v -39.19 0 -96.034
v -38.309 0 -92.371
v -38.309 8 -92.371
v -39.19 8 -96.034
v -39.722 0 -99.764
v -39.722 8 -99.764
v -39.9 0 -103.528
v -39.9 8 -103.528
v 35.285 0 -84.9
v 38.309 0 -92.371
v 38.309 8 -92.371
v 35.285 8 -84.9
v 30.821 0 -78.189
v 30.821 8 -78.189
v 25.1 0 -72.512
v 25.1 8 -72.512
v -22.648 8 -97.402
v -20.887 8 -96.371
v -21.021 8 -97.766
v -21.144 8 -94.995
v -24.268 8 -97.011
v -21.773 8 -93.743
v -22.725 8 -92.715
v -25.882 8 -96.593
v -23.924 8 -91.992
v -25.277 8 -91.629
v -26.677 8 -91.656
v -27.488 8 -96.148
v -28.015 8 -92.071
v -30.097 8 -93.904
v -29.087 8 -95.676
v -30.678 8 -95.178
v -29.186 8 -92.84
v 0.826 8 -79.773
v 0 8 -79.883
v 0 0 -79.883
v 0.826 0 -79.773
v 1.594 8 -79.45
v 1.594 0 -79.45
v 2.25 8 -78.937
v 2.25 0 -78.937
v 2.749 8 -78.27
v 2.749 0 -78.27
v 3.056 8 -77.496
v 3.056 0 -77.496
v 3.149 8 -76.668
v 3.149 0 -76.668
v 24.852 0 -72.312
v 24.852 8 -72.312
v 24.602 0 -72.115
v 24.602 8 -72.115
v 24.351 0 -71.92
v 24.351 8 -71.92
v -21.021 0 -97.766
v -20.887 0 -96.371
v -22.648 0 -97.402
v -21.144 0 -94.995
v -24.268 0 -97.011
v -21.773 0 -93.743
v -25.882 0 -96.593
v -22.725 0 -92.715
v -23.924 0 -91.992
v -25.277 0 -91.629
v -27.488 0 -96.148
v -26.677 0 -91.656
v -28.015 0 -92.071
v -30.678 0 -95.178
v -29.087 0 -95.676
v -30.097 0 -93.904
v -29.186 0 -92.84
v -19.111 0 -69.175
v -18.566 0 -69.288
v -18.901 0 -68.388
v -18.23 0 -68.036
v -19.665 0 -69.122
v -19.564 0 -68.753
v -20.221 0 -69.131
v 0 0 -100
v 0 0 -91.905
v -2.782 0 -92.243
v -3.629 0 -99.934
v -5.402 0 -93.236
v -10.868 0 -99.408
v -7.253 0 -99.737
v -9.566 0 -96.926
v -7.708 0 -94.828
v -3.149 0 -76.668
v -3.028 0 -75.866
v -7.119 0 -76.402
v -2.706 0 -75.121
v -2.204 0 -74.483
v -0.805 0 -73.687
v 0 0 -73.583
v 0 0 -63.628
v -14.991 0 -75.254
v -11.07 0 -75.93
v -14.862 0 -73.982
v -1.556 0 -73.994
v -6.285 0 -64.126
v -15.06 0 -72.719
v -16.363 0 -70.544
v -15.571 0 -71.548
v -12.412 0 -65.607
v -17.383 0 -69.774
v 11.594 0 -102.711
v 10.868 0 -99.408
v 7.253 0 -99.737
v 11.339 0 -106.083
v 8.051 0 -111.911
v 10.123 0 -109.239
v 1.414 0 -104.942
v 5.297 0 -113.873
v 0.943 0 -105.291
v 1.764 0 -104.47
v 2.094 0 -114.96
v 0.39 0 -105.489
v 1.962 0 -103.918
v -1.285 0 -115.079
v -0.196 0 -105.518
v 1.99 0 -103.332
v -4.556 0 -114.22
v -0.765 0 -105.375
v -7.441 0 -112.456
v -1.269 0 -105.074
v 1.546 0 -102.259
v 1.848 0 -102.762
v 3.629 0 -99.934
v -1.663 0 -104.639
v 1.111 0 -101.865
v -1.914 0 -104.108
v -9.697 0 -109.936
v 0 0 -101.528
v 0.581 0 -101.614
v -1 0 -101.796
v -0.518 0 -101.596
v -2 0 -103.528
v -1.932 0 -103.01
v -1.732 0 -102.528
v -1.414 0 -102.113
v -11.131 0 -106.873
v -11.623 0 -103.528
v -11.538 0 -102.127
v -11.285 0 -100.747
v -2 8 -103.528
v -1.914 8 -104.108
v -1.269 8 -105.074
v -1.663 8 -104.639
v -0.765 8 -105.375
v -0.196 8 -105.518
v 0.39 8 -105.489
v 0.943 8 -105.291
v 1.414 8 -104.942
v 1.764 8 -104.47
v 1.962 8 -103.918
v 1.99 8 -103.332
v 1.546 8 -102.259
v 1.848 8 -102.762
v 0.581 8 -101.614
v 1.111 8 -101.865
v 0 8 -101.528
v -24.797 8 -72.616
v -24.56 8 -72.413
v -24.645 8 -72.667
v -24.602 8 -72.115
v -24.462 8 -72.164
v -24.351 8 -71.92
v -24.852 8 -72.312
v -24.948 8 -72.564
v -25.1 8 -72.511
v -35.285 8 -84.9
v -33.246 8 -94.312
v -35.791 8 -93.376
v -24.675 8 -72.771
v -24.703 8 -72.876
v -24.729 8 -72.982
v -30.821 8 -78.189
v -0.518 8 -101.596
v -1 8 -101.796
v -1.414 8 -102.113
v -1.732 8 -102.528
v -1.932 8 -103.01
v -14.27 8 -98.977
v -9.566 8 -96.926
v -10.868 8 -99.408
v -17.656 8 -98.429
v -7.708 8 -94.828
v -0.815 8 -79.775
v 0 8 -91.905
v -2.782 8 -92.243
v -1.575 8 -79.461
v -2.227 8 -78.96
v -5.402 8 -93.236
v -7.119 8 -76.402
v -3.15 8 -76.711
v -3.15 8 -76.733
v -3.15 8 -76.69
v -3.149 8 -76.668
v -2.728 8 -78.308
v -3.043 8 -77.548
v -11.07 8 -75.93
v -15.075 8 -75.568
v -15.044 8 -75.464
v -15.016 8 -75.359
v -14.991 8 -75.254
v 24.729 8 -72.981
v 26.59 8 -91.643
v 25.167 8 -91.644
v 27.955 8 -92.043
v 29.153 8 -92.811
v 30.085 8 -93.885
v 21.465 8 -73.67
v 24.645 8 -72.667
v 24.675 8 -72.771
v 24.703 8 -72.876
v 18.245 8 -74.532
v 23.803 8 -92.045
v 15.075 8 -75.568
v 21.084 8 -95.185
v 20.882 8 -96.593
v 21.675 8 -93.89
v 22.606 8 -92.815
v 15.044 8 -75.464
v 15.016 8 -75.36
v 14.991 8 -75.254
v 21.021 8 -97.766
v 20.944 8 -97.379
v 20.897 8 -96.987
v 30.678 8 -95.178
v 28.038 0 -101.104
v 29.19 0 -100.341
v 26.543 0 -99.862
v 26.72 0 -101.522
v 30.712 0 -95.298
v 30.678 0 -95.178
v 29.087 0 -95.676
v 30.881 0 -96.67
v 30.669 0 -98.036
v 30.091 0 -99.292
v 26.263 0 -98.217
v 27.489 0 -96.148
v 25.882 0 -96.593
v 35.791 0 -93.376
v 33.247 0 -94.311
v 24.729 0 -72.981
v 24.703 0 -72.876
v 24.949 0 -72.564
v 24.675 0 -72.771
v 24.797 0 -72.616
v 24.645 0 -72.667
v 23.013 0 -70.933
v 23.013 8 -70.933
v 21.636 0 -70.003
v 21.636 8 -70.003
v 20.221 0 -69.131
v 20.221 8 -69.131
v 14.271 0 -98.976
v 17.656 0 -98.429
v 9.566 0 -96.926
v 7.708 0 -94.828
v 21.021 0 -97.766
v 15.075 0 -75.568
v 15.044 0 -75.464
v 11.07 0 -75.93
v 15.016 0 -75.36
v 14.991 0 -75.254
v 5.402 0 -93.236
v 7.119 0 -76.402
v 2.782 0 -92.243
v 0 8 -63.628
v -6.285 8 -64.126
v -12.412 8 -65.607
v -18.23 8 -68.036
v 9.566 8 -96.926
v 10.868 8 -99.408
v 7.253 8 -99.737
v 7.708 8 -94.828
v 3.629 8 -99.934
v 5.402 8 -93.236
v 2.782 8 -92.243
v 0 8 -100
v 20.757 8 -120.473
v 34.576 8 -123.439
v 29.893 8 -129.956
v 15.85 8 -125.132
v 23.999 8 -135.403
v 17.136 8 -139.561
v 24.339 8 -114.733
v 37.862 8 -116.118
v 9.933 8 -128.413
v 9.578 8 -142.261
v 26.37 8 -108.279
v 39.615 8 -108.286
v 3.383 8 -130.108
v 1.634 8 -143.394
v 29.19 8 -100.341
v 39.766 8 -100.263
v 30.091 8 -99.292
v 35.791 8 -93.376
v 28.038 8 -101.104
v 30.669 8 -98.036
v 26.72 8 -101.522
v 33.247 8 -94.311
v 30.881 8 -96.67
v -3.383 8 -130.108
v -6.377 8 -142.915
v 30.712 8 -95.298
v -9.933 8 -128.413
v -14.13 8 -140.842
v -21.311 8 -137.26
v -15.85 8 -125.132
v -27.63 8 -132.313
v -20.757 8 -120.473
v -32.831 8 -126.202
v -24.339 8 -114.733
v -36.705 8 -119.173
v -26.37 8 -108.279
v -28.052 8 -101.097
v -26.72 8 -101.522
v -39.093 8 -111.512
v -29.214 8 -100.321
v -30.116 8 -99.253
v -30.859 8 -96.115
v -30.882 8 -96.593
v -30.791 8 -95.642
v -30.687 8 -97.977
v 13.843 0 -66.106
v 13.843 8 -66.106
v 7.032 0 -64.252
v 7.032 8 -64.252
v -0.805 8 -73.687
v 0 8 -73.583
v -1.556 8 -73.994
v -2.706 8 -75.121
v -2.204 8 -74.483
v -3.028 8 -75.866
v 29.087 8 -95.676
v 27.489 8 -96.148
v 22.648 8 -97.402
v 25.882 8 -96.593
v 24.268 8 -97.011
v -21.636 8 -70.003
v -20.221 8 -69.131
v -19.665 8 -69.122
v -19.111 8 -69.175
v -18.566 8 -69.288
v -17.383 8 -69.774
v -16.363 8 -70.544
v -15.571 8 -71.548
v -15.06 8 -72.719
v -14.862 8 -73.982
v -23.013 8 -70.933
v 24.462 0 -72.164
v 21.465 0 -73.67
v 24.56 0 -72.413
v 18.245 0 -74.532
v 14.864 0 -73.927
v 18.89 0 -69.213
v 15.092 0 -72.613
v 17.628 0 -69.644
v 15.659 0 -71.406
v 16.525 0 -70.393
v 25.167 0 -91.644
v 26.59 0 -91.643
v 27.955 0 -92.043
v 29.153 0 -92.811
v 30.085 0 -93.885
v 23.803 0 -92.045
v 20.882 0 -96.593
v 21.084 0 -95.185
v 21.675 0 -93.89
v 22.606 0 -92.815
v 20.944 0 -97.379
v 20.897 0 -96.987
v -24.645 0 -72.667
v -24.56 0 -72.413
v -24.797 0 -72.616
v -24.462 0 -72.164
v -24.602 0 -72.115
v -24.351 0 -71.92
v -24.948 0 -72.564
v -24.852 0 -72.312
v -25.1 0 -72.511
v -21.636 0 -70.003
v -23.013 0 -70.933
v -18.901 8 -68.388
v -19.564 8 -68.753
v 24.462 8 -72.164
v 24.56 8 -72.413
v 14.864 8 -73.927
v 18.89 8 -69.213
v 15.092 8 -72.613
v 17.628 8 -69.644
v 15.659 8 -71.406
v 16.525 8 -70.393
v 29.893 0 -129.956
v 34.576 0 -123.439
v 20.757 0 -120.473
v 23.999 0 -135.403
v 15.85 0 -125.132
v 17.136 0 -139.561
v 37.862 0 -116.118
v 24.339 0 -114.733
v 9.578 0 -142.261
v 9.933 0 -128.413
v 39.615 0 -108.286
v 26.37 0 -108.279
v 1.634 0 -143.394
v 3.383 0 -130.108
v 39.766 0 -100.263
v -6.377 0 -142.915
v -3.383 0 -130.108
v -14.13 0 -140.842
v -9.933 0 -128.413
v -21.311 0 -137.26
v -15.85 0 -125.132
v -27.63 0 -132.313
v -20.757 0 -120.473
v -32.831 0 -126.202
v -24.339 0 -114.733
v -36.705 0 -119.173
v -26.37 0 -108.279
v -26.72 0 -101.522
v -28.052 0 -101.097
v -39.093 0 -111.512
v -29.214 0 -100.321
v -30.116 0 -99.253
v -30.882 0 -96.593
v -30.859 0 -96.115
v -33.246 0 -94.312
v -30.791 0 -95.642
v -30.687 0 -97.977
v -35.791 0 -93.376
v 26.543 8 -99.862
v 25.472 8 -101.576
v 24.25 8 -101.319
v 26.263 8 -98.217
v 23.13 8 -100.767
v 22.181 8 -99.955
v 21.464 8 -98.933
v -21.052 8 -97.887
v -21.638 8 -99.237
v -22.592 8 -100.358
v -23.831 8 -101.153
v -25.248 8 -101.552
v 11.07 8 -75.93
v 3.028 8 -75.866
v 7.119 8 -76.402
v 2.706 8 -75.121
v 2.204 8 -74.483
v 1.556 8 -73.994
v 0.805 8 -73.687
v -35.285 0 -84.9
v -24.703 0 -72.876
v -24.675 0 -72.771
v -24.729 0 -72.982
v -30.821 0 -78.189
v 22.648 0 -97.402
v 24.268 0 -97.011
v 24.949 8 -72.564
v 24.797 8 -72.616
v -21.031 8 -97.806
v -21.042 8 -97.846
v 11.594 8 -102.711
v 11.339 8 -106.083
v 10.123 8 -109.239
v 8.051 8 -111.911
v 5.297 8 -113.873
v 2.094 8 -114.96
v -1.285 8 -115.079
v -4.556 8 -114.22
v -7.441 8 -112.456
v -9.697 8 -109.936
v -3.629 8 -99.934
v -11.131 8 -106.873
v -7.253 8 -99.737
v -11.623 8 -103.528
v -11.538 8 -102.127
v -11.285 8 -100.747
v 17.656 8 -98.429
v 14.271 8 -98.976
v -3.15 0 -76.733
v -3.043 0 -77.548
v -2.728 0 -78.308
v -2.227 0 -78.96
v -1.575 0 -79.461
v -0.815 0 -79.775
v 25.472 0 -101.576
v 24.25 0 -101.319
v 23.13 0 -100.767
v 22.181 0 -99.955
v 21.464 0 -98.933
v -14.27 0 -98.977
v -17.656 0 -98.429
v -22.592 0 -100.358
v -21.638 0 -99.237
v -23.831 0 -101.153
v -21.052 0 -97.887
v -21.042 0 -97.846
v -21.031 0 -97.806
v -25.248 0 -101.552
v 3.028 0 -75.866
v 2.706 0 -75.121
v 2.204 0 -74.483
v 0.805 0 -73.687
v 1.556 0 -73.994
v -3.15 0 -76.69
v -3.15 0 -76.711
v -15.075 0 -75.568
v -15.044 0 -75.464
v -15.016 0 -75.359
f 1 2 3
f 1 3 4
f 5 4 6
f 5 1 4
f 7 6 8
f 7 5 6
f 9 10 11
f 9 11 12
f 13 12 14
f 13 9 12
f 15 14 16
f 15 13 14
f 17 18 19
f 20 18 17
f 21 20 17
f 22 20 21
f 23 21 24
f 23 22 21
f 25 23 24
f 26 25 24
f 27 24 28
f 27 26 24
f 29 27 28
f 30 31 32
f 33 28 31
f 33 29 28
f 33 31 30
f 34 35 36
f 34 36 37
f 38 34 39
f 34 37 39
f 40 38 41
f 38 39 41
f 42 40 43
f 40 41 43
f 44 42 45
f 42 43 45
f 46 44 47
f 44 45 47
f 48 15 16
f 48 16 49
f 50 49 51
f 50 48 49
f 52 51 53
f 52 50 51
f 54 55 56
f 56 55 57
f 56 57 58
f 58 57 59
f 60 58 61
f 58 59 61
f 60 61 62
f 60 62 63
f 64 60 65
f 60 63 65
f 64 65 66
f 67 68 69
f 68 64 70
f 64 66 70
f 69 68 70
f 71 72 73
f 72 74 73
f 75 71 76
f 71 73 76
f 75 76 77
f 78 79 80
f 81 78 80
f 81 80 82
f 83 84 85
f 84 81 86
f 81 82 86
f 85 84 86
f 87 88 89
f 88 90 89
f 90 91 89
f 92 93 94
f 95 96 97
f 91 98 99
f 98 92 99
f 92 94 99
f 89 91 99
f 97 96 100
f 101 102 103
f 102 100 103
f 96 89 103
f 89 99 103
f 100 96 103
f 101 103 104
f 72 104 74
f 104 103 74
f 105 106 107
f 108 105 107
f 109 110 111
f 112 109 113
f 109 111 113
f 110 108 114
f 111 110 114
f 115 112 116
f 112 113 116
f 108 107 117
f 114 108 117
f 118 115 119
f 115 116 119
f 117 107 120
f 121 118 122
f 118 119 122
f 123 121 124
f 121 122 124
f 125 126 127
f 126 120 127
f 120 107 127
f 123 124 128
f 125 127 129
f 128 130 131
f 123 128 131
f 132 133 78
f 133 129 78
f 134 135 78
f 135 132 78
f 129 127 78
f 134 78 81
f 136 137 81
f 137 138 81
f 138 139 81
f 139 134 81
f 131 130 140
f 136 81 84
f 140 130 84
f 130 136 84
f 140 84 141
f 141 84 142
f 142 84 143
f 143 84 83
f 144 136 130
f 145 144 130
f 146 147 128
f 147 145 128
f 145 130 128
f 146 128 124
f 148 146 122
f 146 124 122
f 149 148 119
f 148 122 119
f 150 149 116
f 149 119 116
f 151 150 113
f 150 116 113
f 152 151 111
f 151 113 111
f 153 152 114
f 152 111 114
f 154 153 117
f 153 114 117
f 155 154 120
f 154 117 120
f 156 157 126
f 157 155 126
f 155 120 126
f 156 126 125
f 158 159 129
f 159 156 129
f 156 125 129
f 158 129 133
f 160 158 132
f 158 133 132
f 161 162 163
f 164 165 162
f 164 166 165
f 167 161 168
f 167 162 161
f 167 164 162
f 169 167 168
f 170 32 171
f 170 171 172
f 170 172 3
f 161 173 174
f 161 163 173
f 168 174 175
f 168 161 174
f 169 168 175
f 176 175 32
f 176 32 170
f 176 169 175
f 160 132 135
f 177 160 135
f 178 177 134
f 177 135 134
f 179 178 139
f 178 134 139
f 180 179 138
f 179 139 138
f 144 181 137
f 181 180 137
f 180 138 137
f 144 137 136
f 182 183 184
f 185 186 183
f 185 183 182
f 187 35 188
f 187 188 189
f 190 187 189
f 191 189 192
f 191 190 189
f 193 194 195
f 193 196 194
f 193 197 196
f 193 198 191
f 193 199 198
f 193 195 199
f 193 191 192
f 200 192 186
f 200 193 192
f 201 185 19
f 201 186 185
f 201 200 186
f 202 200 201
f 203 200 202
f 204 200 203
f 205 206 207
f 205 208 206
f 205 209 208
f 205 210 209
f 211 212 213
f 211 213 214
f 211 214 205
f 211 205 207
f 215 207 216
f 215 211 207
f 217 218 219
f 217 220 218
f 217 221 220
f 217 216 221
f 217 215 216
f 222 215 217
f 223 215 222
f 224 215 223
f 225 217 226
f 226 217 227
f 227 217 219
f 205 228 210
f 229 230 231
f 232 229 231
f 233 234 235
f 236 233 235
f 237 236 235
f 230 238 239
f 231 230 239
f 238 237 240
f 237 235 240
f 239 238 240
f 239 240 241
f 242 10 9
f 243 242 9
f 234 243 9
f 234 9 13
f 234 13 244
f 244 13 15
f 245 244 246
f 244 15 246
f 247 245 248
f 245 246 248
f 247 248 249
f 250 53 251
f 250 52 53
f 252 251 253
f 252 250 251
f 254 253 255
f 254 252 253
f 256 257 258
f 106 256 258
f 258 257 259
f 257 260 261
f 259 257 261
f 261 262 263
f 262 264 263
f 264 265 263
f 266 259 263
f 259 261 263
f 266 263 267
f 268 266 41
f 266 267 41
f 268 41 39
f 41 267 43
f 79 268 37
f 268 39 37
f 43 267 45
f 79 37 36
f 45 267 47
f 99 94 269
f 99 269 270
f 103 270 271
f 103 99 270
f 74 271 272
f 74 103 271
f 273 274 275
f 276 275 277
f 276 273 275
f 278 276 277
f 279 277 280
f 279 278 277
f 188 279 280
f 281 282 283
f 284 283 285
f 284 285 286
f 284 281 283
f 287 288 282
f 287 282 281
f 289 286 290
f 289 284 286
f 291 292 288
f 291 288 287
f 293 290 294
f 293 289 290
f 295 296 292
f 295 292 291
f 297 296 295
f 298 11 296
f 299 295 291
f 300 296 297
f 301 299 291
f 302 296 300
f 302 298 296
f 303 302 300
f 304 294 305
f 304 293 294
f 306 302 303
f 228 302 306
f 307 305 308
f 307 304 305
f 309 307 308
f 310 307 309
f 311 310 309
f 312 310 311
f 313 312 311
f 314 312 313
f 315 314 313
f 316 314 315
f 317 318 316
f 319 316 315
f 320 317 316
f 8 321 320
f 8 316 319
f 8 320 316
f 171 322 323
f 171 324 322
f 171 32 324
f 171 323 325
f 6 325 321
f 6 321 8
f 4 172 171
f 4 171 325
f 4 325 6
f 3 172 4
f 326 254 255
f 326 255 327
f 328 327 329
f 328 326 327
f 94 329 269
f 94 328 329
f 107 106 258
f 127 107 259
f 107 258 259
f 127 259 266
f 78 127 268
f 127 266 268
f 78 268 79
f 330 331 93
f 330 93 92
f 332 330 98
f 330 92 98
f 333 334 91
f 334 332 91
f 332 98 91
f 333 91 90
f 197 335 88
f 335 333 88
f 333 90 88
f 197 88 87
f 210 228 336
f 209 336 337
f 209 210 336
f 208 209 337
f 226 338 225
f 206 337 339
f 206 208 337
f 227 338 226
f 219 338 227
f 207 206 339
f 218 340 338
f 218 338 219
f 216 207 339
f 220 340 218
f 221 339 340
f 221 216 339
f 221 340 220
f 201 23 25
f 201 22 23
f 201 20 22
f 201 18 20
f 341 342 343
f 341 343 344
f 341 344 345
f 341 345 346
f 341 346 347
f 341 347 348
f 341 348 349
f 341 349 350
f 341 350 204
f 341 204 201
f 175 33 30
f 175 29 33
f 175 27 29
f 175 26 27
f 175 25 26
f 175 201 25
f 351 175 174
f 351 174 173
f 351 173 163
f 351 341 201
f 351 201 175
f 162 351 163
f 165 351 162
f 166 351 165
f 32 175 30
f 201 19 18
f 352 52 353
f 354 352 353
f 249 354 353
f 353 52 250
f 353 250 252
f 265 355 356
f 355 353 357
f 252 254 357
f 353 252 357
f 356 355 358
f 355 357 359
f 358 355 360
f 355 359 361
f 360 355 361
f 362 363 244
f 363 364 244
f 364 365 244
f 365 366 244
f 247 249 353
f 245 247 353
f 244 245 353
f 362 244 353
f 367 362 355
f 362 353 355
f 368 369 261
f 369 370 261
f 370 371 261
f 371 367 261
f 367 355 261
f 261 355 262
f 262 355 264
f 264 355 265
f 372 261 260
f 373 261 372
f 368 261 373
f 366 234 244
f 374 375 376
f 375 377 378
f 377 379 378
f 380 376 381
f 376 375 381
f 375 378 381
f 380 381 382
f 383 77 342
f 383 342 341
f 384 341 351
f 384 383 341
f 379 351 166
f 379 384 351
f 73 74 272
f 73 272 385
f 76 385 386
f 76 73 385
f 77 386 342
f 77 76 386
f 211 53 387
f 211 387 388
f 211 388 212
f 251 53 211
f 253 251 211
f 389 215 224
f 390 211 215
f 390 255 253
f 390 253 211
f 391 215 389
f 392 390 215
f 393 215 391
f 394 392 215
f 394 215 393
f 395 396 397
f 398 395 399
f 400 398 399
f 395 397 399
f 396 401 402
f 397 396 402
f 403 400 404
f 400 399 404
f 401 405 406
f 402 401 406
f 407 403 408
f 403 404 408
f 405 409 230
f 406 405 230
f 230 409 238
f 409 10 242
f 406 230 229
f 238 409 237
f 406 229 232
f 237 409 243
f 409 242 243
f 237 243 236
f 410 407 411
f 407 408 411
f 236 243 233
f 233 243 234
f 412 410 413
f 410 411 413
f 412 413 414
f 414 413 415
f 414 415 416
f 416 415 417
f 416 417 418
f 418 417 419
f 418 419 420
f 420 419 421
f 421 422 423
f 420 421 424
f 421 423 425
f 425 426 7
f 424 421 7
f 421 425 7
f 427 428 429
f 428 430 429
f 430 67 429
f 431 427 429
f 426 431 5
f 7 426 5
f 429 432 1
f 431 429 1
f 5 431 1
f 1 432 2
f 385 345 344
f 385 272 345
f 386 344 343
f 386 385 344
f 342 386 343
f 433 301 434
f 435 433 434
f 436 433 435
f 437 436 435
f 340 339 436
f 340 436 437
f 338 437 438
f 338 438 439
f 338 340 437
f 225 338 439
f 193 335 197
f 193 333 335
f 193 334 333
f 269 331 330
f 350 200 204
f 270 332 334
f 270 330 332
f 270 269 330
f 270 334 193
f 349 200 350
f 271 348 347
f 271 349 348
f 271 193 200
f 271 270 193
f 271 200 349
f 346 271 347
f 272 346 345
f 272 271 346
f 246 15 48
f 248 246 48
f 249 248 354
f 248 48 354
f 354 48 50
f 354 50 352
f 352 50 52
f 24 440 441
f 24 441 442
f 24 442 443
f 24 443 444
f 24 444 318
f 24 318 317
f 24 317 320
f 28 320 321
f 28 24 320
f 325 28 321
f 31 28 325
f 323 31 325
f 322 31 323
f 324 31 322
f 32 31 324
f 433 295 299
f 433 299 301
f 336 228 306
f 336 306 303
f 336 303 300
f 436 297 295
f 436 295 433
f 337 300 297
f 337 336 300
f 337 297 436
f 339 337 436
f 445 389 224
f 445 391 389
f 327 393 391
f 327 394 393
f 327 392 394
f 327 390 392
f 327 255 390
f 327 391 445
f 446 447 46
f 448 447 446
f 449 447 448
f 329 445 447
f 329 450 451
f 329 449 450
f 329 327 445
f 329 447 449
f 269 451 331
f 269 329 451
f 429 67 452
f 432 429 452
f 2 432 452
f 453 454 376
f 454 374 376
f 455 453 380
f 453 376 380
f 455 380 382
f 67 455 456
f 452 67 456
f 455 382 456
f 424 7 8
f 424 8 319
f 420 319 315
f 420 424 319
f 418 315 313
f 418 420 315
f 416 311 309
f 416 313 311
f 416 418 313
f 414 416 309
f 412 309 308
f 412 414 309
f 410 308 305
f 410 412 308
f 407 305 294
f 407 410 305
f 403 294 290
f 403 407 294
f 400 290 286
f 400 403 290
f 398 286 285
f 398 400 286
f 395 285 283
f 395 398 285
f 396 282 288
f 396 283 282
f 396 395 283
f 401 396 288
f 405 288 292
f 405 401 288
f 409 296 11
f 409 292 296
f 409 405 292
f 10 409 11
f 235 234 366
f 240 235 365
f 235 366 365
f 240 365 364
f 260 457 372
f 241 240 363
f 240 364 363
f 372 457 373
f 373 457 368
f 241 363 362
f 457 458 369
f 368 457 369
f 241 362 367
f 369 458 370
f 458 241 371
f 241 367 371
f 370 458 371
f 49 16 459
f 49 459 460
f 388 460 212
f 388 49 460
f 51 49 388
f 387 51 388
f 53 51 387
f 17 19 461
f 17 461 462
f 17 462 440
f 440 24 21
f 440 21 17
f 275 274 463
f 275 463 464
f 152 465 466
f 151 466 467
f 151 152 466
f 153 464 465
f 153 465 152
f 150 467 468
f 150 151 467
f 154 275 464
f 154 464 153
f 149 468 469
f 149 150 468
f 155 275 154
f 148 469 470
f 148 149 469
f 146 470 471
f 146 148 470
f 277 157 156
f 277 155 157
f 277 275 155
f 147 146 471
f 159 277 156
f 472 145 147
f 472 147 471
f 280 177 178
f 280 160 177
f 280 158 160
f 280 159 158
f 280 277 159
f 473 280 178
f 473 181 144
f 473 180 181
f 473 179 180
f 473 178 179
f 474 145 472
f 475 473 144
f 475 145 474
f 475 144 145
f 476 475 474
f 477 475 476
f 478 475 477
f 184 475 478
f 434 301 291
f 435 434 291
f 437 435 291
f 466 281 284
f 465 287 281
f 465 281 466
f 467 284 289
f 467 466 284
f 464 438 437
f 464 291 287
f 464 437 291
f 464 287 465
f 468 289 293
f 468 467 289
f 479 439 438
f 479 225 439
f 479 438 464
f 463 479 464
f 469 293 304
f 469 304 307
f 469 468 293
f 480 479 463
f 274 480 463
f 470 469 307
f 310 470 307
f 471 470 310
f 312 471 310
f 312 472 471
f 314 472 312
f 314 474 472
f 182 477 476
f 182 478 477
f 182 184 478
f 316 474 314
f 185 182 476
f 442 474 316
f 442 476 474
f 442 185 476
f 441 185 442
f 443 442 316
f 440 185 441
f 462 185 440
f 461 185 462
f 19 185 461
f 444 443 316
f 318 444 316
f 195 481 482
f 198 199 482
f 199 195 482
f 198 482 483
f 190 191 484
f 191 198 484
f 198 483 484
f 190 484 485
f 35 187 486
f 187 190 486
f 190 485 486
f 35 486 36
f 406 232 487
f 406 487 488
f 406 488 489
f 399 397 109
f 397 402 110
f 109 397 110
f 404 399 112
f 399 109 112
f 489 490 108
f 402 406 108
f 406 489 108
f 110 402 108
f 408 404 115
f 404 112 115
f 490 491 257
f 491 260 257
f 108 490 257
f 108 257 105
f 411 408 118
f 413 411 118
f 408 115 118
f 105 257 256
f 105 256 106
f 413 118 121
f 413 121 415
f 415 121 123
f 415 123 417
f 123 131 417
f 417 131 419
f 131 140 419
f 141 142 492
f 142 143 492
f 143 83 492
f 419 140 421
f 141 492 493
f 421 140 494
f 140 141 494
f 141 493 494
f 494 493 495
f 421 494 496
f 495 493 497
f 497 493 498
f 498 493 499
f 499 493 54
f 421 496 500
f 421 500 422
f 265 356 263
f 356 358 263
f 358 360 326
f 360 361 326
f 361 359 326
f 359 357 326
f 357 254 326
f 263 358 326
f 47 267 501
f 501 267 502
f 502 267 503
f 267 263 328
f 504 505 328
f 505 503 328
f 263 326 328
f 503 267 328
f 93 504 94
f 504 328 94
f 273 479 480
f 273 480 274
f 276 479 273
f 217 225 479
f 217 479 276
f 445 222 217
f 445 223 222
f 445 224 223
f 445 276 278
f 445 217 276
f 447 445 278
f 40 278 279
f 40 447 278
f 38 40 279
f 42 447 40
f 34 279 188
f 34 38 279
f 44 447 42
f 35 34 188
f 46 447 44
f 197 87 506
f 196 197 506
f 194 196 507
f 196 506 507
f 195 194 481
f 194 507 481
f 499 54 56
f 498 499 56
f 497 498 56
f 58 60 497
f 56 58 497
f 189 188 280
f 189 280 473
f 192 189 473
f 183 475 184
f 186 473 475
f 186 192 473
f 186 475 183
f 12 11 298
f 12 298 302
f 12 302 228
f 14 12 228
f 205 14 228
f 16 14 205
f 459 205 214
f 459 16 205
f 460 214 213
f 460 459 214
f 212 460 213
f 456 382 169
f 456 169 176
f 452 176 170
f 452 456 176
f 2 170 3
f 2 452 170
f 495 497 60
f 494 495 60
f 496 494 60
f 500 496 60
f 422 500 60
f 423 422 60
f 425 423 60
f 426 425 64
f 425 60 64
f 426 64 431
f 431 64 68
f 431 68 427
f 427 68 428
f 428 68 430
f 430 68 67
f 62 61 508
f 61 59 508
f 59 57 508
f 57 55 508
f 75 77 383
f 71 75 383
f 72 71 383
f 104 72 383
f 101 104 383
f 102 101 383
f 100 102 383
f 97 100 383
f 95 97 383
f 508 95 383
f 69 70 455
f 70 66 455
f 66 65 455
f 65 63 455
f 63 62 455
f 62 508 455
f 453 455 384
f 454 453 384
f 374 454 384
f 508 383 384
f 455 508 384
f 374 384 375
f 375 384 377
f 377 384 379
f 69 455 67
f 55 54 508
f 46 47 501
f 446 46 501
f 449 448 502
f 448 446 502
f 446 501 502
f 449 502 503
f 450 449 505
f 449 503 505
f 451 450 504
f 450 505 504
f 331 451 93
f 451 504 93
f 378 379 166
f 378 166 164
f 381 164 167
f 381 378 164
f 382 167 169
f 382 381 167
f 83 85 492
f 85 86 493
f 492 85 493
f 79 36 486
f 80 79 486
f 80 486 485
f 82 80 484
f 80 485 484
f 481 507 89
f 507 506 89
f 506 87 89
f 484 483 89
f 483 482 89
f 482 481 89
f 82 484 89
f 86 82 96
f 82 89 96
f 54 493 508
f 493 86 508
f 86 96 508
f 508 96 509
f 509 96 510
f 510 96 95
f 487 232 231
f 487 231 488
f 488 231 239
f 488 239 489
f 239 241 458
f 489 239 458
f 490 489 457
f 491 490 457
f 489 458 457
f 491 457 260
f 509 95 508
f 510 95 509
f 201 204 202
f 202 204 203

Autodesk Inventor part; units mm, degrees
ref_plane "YZ Plane" through (0, 0, 0) normal (1, 0, 0) x (0, 1, 0)
ref_plane "XZ Plane" through (0, 0, 0) normal (0, 1, 0) x (-1, 0, 0)
ref_plane "XY Plane" through (0, 0, 0) normal (0, 0, 1) x (1, 0, 0)
sketch "Sketch1" plane through (0, 0, 0) normal (0, 1, 0) x (-1, 0, 0)
  circle A0 centre (0, 0) radius 100
  line L0 (0, 0) -> (18.5658, -69.2885)
  line L1 (0, 0) -> (0, -103.5276)
  arc A1 (24.6448, -72.6673) -> (14.9907, -75.2542) centre (0, 0) ccw
  circle A2 centre (25.8819, -96.5926) radius 5
  arc A3 (24.729, -72.9816) -> (15.0747, -75.5678) centre (19.8599, -74.1181) ccw
  line L2 (30.6777, -95.1782) -> (24.6448, -72.6673)
  line L3 (21.0523, -97.8867) -> (14.9907, -75.2542)
  circle A4 centre (0, -103.5276) radius 11.6229
  line L4 (21.0523, -97.8867) -> (25.8819, -96.5926)
  arc A5 (-25.8819, -96.5926) -> (26.7197, -101.5219) centre (0, -103.5276) ccw
  circle A6 centre (0, -103.5276) radius 39.9
  arc A7 (57.9067, -50.8394) -> (50.8389, -57.9063) centre (54.2582, -54.2582) ccw
  line L5 (67.1751, -74.2462) -> (50.6094, -57.6767)
  line L6 (74.1567, -67.0879) -> (57.6767, -50.6094)
  circle A8 centre (70.7107, -70.7107) radius 5
  circle A9 centre (51.7638, -89.6575) radius 11.6229
  arc A10 (75.5684, -15.0748) -> (72.9809, -24.7289) centre (74.1181, -19.8599) ccw
  line L7 (95.2985, -30.7115) -> (72.6673, -24.6448)
  line L8 (97.7655, -21.0214) -> (75.2542, -14.9907)
  circle A11 centre (96.5926, -25.8819) radius 5
  circle A12 centre (89.6575, -51.7638) radius 11.6229
  arc A13 (72.9816, 24.729) -> (75.5678, 15.0747) centre (74.1181, 19.8599) ccw
  line L9 (97.8867, 21.0523) -> (75.2542, 14.9907)
  line L10 (95.1782, 30.6777) -> (72.6673, 24.6448)
  circle A14 centre (96.5926, 25.8819) radius 5
  circle A15 centre (103.5276, 0) radius 11.6229
  arc A16 (50.8394, 57.9067) -> (57.9063, 50.8389) centre (54.2582, 54.2582) ccw
  line L11 (74.2462, 67.1751) -> (57.6767, 50.6094)
  line L12 (67.0879, 74.1567) -> (50.6094, 57.6767)
  circle A17 centre (70.7107, 70.7107) radius 5
  circle A18 centre (89.6575, 51.7638) radius 11.6229
  arc A19 (15.0748, 75.5684) -> (24.7289, 72.9809) centre (19.8599, 74.1181) ccw
  line L13 (30.7115, 95.2985) -> (24.6448, 72.6673)
  line L14 (21.0214, 97.7655) -> (14.9907, 75.2542)
  circle A20 centre (25.8819, 96.5926) radius 5
  circle A21 centre (51.7638, 89.6575) radius 11.6229
  arc A22 (-24.729, 72.9816) -> (-15.0747, 75.5678) centre (-19.8599, 74.1181) ccw
  line L15 (-21.0523, 97.8867) -> (-14.9907, 75.2542)
  line L16 (-30.6777, 95.1782) -> (-24.6448, 72.6673)
  circle A23 centre (-25.8819, 96.5926) radius 5
  circle A24 centre (0, 103.5276) radius 11.6229
  arc A25 (-57.9067, 50.8394) -> (-50.8389, 57.9063) centre (-54.2582, 54.2582) ccw
  line L17 (-67.1751, 74.2462) -> (-50.6094, 57.6767)
  line L18 (-74.1567, 67.0879) -> (-57.6767, 50.6094)
  circle A26 centre (-70.7107, 70.7107) radius 5
  circle A27 centre (-51.7638, 89.6575) radius 11.6229
  arc A28 (-75.5684, 15.0748) -> (-72.9809, 24.7289) centre (-74.1181, 19.8599) ccw
  line L19 (-95.2985, 30.7115) -> (-72.6673, 24.6448)
  line L20 (-97.7655, 21.0214) -> (-75.2542, 14.9907)
  circle A29 centre (-96.5926, 25.8819) radius 5
  circle A30 centre (-89.6575, 51.7638) radius 11.6229
  arc A31 (-72.9816, -24.729) -> (-75.5678, -15.0747) centre (-74.1181, -19.8599) ccw
  line L21 (-97.8867, -21.0523) -> (-75.2542, -14.9907)
  line L22 (-95.1782, -30.6777) -> (-72.6673, -24.6448)
  circle A32 centre (-96.5926, -25.8819) radius 5
  circle A33 centre (-103.5276, 0) radius 11.6229
  arc A34 (-50.8394, -57.9067) -> (-57.9063, -50.8389) centre (-54.2582, -54.2582) ccw
  line L23 (-74.2462, -67.1751) -> (-57.6767, -50.6094)
  line L24 (-67.0879, -74.1567) -> (-50.6094, -57.6767)
  circle A35 centre (-70.7107, -70.7107) radius 5
  circle A36 centre (-89.6575, -51.7638) radius 11.6229
  arc A37 (-15.0748, -75.5684) -> (-24.7289, -72.9809) centre (-19.8599, -74.1181) ccw
  line L25 (-30.7115, -95.2985) -> (-24.6448, -72.6673)
  line L26 (-21.0214, -97.7655) -> (-14.9907, -75.2542)
  circle A38 centre (-25.8819, -96.5926) radius 5
  circle A39 centre (-51.7638, -89.6575) radius 11.6229
  circle A40 centre (0, 0) radius 5
  circle A41 centre (0, -103.5276) radius 2
  circle A42 centre (0, -76.7327) radius 3.15
  point P0 (50.7227, -50.7227)
  point P1 (73.9009, -74.5607)
  point P2 (69.2885, -18.5658)
  point P3 (101.2804, -27.621)
  point P4 (69.2885, 18.5658)
  point P5 (101.5219, 26.7197)
  point P6 (50.7227, 50.7227)
  point P7 (74.5607, 73.9009)
  point P8 (18.5658, 69.2885)
  point P9 (27.621, 101.2804)
  point P10 (-18.5658, 69.2885)
  point P11 (-26.7197, 101.5219)
  point P12 (-50.7227, 50.7227)
  point P13 (-73.9009, 74.5607)
  point P14 (-69.2885, 18.5658)
  point P15 (-101.2804, 27.621)
  point P16 (-69.2885, -18.5658)
  point P17 (-101.5219, -26.7197)
  point P18 (-50.7227, -50.7227)
  point P19 (-74.5607, -73.9009)
  point P20 (-18.5658, -69.2885)
  point P21 (-27.621, -101.2804)
  point P22 (40.2917, -91.5236)
  point P23 (59.1159, -80.6555)
  point P24 (67.0867, -74.1578)
  point P25 (80.6555, -59.1159)
  point P26 (91.5236, -40.2917)
  point P27 (95.1777, -30.6791)
  point P28 (99.4077, -10.8682)
  point P29 (99.4077, 10.8682)
  point P30 (97.7659, 21.0199)
  point P31 (91.5236, 40.2917)
  point P32 (80.6555, 59.1159)
  point P33 (74.1578, 67.0867)
  point P34 (59.1159, 80.6555)
  point P35 (40.2917, 91.5236)
  point P36 (30.6791, 95.1777)
  point P37 (10.8682, 99.4077)
  point P38 (-10.8682, 99.4077)
  point P39 (-21.0199, 97.7659)
  point P40 (-40.2917, 91.5236)
  point P41 (-59.1159, 80.6555)
  point P42 (-67.0867, 74.1578)
  point P43 (-80.6555, 59.1159)
  point P44 (-91.5236, 40.2917)
  point P45 (-95.1777, 30.6791)
  point P46 (-99.4077, 10.8682)
  point P47 (-99.4077, -10.8682)
  point P48 (-97.7659, -21.0199)
  point P49 (-91.5236, -40.2917)
  point P50 (-80.6555, -59.1159)
  point P51 (-74.1578, -67.0867)
  point P52 (-59.1159, -80.6555)
  point P53 (-40.2917, -91.5236)
  point P54 (-30.6791, -95.1777)
  point P55 (-10.8682, -99.4077)
  point P56 (10.8682, -99.4077)
  point P57 (21.0199, -97.7659)
  point P58 (-10.8682, -99.4077)
  point P59 (10.8682, -99.4077)
  dimension "d2" = 200
  dimension "d3" = 15
  dimension "d4" = 10
  dimension "d5" = 10
  dimension "d6" = 79.8
  dimension "d7" = 360
  dimension "d8" = 10
  dimension "d9" = 4
  dimension "d10" = 6.3
extrude "Extrusion1" add sketch "Sketch1" along normal blind 8 contours A0 A38 | A5 A38 L25 A0 | A0 A38 A5 | L26 A37 A1 A42 L1 A4 A0 | A38 L25 A37 A1 L26 | A0 A4 A2 A5 A38 | L25 A38 A5 A2 A0 A6 | A0 A6 A1 A37 L25 | A4 L1 A0 | A0 A4 | A2 L4 A0 | L1 A4 A0 | L1 A42 A1 A3 L3 A0 A4 | A37 A6 L1 A42 A1 | A1 A37 A6 | A6 A37 A1 | A2 A0 L4 | A0 L2 A3 A1 A6 | A2 A0 | L3 A3 A6 L2 A2 | L1 A6 L0 A3 A1 A42 | A1 A3 A6 | A3 L3 | A6 A3 L0
properties part number "topper"
